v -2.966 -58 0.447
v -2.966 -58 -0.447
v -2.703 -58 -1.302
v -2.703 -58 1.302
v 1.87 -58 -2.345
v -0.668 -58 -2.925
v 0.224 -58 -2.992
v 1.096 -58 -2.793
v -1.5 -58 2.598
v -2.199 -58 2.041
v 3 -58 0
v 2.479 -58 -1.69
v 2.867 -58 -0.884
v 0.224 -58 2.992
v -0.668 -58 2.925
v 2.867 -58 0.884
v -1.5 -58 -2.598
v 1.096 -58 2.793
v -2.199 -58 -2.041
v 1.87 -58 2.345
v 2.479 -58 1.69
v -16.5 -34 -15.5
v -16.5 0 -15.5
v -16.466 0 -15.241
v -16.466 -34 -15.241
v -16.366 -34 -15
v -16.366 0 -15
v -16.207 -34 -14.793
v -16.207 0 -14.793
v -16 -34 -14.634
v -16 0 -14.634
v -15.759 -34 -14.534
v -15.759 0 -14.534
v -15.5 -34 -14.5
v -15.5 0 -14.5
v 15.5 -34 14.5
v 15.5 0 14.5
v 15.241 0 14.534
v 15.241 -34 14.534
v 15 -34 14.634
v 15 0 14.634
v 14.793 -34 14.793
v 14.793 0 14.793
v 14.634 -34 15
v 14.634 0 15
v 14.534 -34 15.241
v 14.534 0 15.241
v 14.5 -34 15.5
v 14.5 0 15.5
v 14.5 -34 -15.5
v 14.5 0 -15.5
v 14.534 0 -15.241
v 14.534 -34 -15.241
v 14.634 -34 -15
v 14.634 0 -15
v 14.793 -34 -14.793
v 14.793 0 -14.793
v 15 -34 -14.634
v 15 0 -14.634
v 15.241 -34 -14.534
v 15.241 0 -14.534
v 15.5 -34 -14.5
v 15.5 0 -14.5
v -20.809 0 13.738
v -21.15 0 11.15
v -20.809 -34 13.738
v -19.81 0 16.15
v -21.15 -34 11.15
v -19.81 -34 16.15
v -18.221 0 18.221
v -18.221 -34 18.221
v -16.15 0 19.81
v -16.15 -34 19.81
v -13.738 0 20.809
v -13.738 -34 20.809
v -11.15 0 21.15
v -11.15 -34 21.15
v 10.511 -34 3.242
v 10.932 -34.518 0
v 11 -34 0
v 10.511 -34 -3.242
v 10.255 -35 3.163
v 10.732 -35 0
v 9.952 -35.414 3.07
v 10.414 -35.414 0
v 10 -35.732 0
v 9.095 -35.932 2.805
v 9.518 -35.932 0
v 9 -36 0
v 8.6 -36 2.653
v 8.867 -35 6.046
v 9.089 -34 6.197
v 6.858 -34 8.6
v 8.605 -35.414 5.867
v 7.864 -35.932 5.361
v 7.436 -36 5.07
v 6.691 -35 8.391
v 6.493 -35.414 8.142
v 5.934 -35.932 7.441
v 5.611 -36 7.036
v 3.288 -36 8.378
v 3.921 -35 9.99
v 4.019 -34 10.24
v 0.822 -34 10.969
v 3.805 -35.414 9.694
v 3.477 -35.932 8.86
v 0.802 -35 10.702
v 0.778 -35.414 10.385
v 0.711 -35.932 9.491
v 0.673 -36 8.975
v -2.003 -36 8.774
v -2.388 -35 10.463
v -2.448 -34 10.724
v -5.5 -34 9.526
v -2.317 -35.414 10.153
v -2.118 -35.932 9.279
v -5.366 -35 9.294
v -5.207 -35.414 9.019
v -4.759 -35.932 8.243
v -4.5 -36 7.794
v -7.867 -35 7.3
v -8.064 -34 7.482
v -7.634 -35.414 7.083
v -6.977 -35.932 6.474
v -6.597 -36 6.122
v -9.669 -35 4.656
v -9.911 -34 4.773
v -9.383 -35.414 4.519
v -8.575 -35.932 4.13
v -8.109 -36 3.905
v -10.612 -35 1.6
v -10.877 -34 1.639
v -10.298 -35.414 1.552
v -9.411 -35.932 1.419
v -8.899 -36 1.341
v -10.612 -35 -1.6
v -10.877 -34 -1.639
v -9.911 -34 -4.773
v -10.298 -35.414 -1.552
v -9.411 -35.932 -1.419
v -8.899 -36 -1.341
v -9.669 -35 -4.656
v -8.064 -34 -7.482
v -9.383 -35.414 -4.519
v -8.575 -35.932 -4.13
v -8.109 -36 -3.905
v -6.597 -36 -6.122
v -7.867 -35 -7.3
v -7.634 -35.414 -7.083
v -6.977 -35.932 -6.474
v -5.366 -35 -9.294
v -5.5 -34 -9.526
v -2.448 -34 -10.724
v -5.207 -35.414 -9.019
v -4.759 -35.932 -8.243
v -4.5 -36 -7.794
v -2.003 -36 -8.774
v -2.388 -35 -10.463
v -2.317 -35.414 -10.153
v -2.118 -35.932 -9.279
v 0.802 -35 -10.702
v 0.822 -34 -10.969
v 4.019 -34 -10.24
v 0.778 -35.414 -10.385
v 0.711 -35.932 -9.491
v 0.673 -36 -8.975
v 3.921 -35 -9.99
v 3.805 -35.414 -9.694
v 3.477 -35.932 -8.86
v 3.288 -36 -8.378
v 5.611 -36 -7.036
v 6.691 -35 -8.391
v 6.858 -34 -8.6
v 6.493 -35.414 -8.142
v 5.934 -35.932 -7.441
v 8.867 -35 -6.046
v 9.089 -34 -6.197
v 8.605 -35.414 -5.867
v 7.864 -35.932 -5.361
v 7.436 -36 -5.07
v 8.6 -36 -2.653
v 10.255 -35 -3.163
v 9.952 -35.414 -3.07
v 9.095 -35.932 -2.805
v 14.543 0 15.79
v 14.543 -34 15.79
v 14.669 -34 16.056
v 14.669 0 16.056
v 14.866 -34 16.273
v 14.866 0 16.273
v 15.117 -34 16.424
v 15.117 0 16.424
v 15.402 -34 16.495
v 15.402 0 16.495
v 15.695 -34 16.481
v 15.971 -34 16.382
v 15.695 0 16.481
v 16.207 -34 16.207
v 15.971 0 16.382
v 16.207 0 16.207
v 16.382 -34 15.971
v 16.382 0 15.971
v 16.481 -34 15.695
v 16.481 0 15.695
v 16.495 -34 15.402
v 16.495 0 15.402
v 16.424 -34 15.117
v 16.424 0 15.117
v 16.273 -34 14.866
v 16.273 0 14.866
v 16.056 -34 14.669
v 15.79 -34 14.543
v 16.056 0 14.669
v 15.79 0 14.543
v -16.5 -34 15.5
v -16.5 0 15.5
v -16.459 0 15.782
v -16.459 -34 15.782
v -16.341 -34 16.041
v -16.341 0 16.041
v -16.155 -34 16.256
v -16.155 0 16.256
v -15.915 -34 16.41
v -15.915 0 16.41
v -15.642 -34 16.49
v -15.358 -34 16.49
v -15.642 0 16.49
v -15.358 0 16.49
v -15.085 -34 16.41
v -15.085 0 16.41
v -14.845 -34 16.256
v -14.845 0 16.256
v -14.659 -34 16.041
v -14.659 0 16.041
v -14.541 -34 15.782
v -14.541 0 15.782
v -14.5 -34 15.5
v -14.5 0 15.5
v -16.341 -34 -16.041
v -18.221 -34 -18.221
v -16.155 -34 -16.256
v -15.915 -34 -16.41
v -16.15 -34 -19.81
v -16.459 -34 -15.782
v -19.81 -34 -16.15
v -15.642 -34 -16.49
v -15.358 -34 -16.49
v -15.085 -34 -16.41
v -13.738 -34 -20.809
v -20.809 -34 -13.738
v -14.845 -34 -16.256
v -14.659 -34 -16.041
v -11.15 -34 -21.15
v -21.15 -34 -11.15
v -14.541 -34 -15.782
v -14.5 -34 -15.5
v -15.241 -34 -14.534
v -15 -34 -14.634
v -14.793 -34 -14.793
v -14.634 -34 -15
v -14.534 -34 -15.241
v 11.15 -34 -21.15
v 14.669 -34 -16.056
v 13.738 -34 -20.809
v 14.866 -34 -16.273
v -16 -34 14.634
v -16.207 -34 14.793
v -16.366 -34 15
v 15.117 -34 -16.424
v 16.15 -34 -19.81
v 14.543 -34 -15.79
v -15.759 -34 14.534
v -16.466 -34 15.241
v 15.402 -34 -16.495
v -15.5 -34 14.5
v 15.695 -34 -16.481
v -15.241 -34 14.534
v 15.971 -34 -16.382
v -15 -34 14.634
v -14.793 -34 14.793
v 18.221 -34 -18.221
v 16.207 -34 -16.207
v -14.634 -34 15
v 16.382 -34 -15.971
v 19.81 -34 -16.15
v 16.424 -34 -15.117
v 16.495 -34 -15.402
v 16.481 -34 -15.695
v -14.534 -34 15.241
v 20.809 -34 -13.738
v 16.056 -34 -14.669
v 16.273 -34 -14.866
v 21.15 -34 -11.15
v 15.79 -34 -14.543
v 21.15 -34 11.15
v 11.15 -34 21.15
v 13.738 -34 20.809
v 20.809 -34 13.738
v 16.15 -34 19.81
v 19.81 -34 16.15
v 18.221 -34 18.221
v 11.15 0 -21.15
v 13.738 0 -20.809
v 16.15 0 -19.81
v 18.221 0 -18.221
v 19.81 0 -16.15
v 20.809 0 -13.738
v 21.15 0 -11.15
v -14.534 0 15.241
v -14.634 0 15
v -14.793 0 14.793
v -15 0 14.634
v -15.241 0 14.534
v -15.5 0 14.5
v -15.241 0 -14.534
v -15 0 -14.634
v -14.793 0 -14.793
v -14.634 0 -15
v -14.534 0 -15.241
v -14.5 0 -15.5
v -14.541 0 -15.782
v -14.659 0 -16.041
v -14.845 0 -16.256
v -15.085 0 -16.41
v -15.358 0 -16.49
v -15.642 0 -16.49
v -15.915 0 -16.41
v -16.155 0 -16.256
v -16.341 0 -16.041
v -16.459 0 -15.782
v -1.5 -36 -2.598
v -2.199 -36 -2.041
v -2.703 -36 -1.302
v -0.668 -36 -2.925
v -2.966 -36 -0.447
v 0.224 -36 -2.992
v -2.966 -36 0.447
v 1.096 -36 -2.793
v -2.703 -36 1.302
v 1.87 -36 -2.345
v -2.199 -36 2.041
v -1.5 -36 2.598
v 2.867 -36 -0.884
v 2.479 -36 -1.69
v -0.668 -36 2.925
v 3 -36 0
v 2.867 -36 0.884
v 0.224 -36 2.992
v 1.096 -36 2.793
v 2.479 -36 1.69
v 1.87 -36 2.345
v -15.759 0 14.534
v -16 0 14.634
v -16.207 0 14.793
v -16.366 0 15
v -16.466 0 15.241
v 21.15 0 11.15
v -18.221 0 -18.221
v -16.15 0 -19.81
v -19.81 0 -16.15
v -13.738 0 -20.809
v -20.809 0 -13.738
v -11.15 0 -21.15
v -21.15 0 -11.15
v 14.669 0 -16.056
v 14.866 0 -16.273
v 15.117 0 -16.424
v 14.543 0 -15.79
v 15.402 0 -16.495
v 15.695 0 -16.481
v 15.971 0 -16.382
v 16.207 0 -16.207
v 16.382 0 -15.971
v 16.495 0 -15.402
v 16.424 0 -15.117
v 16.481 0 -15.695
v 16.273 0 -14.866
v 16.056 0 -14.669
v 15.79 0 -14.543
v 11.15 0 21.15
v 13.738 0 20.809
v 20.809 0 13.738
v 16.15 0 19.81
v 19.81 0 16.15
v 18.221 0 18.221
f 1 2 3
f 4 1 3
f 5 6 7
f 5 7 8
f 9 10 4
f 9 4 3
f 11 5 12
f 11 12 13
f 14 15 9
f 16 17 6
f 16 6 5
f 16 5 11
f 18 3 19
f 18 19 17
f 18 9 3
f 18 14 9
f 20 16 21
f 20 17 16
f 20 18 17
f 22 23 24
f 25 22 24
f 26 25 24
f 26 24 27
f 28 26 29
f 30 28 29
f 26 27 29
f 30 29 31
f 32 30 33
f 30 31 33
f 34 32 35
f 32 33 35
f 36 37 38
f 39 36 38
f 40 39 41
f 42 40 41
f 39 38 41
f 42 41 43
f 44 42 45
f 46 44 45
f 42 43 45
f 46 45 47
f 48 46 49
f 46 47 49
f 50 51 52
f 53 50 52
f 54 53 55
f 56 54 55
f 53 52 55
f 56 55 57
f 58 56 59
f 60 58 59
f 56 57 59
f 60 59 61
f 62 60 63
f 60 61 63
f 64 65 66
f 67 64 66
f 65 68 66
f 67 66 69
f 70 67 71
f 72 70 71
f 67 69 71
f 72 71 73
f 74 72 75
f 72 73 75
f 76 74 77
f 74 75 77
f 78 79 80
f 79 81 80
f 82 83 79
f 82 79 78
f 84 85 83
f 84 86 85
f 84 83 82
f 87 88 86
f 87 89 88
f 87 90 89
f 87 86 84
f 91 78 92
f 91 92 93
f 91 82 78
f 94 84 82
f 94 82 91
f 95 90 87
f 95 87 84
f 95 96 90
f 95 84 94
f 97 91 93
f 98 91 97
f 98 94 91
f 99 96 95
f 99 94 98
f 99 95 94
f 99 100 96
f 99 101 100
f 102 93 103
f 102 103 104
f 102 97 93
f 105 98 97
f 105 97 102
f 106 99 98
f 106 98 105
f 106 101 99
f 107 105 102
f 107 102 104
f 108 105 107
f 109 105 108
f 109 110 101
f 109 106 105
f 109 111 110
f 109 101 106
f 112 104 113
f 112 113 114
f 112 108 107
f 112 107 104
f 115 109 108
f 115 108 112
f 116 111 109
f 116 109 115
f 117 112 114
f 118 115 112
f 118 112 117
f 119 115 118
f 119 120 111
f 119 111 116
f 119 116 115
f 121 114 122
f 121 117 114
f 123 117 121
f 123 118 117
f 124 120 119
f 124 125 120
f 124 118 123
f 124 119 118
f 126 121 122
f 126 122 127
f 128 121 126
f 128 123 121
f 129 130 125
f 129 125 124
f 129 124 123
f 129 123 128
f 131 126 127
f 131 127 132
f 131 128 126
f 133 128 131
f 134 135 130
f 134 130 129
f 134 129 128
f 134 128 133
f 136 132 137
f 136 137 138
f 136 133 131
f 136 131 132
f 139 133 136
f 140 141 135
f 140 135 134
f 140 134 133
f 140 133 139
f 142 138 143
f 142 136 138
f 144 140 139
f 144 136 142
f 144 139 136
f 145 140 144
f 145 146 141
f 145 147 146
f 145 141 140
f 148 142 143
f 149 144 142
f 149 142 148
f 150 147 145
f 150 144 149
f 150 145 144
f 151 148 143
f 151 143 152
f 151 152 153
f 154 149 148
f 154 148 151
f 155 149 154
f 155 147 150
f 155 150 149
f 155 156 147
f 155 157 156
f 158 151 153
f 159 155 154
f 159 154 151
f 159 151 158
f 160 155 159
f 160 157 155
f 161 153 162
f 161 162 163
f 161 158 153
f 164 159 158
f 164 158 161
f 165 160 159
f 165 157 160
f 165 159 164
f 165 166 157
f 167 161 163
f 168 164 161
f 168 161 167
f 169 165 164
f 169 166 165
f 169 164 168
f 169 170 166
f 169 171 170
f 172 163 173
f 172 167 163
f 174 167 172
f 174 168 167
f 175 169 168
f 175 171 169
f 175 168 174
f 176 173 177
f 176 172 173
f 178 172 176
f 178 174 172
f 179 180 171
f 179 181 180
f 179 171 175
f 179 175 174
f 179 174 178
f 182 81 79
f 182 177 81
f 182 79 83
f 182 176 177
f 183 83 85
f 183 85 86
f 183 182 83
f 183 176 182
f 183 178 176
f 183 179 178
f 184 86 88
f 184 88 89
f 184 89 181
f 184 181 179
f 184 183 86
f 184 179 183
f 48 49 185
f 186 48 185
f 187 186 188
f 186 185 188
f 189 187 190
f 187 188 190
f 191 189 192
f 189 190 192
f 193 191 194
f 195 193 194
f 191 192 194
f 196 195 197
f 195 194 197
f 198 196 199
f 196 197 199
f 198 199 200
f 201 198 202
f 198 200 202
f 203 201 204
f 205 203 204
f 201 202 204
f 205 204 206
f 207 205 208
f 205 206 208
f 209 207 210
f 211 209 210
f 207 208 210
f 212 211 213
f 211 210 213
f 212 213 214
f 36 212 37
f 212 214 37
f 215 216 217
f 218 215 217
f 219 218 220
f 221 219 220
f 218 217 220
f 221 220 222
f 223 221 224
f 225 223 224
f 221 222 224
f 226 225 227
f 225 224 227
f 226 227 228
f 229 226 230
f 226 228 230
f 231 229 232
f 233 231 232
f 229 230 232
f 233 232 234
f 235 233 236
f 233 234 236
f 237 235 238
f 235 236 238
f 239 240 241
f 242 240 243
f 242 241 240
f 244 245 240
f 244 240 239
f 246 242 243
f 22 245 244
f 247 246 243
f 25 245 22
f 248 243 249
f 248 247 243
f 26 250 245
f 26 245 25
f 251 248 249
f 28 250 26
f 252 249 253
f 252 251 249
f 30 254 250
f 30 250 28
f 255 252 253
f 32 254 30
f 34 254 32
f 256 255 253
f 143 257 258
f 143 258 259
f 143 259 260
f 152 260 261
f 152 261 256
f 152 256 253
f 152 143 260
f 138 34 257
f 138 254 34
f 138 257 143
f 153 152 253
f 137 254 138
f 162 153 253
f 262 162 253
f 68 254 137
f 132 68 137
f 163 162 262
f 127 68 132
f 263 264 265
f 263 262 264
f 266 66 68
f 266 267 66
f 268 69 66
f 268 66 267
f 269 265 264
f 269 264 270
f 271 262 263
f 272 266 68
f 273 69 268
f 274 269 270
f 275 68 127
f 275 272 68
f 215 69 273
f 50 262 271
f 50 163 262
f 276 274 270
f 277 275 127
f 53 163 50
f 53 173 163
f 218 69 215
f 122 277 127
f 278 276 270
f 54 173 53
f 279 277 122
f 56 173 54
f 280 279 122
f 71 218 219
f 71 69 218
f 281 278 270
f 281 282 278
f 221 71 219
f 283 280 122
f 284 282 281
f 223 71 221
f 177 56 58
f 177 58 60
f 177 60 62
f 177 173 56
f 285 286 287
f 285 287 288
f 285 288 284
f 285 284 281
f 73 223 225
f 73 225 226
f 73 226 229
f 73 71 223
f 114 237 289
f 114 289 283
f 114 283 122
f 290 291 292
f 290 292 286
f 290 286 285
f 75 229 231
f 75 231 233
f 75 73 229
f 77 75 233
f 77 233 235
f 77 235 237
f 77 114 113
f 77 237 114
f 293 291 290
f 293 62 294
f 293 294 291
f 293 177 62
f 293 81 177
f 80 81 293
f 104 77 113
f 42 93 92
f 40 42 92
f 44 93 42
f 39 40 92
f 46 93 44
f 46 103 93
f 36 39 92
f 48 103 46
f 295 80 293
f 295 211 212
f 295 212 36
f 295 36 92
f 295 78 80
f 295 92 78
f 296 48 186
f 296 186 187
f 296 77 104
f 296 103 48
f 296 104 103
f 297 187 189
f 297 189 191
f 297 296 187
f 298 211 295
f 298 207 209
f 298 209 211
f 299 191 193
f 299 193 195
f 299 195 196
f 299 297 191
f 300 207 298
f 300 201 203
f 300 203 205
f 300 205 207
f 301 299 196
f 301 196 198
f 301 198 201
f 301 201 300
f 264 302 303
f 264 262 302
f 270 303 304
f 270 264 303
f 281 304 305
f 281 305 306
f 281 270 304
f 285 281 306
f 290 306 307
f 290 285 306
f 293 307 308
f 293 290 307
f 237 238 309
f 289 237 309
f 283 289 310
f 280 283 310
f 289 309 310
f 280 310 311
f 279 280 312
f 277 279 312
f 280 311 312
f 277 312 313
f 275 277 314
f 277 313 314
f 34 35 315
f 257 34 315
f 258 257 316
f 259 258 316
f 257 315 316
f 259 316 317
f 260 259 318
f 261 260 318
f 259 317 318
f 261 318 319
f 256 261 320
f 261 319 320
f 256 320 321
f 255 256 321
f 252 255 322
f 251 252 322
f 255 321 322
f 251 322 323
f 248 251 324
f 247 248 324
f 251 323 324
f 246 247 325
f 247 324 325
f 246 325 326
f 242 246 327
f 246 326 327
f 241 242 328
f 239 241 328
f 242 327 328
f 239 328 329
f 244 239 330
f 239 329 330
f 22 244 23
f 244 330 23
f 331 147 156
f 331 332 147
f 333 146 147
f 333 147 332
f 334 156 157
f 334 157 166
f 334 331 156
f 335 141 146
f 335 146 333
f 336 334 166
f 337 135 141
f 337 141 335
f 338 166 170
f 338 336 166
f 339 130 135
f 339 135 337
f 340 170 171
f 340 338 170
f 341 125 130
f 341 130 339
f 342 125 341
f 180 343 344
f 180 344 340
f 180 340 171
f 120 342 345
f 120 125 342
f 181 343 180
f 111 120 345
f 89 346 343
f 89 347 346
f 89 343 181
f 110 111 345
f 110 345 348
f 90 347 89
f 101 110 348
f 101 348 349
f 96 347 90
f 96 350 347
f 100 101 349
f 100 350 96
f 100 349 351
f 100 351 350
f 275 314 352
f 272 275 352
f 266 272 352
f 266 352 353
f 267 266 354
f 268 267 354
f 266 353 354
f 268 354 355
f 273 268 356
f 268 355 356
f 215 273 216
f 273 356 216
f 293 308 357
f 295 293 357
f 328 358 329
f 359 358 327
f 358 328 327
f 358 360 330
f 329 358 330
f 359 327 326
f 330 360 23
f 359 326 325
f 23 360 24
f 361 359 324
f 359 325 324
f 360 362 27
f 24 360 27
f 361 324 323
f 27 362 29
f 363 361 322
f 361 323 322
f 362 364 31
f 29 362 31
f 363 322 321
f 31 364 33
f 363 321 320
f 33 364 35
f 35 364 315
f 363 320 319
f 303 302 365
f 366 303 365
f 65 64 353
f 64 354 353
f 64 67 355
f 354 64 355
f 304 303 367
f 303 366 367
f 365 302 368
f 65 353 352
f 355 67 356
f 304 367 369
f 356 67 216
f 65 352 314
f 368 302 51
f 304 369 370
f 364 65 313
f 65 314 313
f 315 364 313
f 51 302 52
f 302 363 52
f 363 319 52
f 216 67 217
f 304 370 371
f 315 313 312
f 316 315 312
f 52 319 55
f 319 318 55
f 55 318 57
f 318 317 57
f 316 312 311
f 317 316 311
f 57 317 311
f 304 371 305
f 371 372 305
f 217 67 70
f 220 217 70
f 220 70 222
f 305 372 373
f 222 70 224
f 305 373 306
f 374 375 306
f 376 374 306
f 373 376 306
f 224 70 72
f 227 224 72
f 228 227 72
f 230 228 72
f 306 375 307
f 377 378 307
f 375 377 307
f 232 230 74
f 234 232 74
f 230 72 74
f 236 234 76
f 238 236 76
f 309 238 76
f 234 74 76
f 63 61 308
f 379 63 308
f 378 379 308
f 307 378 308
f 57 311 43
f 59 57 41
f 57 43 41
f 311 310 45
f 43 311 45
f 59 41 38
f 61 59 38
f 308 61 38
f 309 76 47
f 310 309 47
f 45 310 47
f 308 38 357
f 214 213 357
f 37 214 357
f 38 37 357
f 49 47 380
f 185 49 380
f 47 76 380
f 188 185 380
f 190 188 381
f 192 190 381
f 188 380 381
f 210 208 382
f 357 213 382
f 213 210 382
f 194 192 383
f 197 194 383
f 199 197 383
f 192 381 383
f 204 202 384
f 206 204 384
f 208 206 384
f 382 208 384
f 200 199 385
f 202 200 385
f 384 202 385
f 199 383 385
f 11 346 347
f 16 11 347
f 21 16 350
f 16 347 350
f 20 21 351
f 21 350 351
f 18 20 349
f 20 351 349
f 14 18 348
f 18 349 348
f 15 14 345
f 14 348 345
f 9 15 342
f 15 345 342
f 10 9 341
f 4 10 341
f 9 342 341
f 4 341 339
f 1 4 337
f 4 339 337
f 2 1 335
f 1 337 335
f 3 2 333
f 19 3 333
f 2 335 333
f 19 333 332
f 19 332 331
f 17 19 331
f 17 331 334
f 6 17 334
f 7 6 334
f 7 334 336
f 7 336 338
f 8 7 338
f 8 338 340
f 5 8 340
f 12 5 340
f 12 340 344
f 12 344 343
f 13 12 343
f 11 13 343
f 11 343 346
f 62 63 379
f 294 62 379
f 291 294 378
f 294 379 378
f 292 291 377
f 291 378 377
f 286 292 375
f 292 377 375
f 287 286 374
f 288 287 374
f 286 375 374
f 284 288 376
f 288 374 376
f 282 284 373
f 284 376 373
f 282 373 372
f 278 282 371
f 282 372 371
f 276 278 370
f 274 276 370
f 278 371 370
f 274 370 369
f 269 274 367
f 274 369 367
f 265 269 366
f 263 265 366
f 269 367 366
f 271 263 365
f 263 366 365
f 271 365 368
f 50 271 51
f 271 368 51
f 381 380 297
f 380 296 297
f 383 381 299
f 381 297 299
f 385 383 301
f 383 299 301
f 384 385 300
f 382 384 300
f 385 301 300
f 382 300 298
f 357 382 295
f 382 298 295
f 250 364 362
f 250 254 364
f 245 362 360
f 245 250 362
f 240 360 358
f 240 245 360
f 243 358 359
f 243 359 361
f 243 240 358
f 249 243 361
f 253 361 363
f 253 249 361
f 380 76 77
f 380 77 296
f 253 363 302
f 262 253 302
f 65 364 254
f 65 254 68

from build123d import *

# Parameters (mm, degrees)
F0_W     = 42.3
F0_H     = 42.3
F1_DEPTH = 34
F2_R     = 3
F3_DEPTH = 24
F5_DEPTH = 58.001
F6_R     = 11
F7_DEPTH = 2
F8_R     = 10
F9_R     = 1.99999


# Not quite as in the source:
# - a fillet or chamfer is up to 0.001 mm smaller than in the source, because OpenCascade refuses the exact size


with BuildPart() as f1:
    # F0 (on Front) → F1 (new body)
    with BuildSketch(Plane.XZ):
        Rectangle(F0_W, F0_H)
    extrude(amount=F1_DEPTH)

    # F2 (on face) → F3 (join)
    with BuildSketch(Plane.XZ.offset(34)):
        Circle(F2_R)
    extrude(amount=F3_DEPTH)

    # F4 (on face) → F5 (cut, through all)
    with BuildSketch(Plane(origin=(0, 0, 0), x_dir=(-1, 0, 0), z_dir=(0, 1, 0))):
        with BuildLine():
            Line((-15.5, 14.5), (-15.5, 15.5))
            Line((-15.5, 15.5), (-14.5, 15.5))
            ThreePointArc((-14.5, 15.5), (-16.2071067812, 16.2071067812), (-15.5, 14.5))
        make_face()
        with BuildLine():
            ThreePointArc((16.5, 15.5), (15.5, 16.5), (14.5, 15.5))
            Line((14.5, 15.5), (15.5, 15.5))
            Line((15.5, 15.5), (15.5, 14.5))
            ThreePointArc((15.5, 14.5), (16.2071067812, 14.7928932188), (16.5, 15.5))
        make_face()
        with BuildLine():
            Line((-15.5, -15.5), (-15.5, -14.5))
            ThreePointArc((-15.5, -14.5), (-16.2071067812, -16.2071067812), (-14.5, -15.5))
            Line((-14.5, -15.5), (-15.5, -15.5))
        make_face()
        with BuildLine():
            ThreePointArc((16.5, -15.5), (16.2071067812, -14.7928932188), (15.5, -14.5))
            Line((15.5, -14.5), (15.5, -15.5))
            Line((15.5, -15.5), (14.5, -15.5))
            ThreePointArc((14.5, -15.5), (15.5, -16.5), (16.5, -15.5))
        make_face()
        with BuildLine():
            Line((15.5, 15.5), (14.5, 15.5))
            ThreePointArc((14.5, 15.5), (14.7928932188, 14.7928932188), (15.5, 14.5))
            Line((15.5, 14.5), (15.5, 15.5))
        make_face()
        with BuildLine():
            Line((-14.5, 15.5), (-15.5, 15.5))
            Line((-15.5, 15.5), (-15.5, 14.5))
            ThreePointArc((-15.5, 14.5), (-14.7928932188, 14.7928932188), (-14.5, 15.5))
        make_face()
        with BuildLine():
            ThreePointArc((-14.5, -15.5), (-14.7928932188, -14.7928932188), (-15.5, -14.5))
            Line((-15.5, -14.5), (-15.5, -15.5))
            Line((-15.5, -15.5), (-14.5, -15.5))
        make_face()
        with BuildLine():
            Line((15.5, -15.5), (15.5, -14.5))
            ThreePointArc((15.5, -14.5), (14.7928932188, -14.7928932188), (14.5, -15.5))
            Line((14.5, -15.5), (15.5, -15.5))
        make_face()
    extrude(amount=-F5_DEPTH, mode=Mode.SUBTRACT)

    # F6 (on face) → F7 (join)
    with BuildSketch(Plane.XZ.offset(34)):
        Circle(F6_R)
    extrude(amount=F7_DEPTH)

    # F8
    f8_edges = [f1.edges().sort_by_distance(p)[0] for p in [
        (21.15, -17, 21.15),
        (-21.15, -17, 21.15),
        (21.15, -17, -21.15),
        (-21.15, -17, -21.15),
    ]]
    fillet(f8_edges, radius=F8_R)

    # F9 (radius 2 in the source; OpenCascade refuses exactly that, so slightly less here)
    f9_edges = [f1.edges().sort_by_distance(p)[0] for p in [
        (-11, -36, 0),
    ]]
    fillet(f9_edges, radius=F9_R)


solid = f1.part
